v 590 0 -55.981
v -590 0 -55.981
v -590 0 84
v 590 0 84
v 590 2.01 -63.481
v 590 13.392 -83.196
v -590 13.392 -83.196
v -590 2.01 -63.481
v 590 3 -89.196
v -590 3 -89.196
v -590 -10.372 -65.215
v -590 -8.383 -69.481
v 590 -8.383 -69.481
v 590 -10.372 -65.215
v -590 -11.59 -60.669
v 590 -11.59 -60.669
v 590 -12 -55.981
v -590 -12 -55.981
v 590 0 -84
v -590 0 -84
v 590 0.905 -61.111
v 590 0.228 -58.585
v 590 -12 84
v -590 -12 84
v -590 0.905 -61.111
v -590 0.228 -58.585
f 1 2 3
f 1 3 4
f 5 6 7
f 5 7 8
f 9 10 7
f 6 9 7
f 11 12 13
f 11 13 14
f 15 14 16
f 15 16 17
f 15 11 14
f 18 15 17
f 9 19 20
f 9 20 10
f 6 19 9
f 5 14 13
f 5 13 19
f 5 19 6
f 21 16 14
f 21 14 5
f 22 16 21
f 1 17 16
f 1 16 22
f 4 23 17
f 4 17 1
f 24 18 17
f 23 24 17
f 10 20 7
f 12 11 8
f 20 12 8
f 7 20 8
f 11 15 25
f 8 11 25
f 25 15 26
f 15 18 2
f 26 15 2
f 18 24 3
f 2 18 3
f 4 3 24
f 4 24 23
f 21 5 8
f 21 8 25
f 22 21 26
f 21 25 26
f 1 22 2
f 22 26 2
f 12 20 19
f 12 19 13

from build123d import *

# Parameters (mm, degrees)
SKETCH1_W            = 1180
SKETCH1_H            = 168
BASE_FLANGE1_DEPTH   = 12
EDGE_FLANGE1_START   = -590
EDGE_FLANGE1_DEPTH   = 1180
EDGE_FLANGE1_2_DEPTH = 1180


# Read off the part's stored shape, not the designer's step: Edge-Flange1
# Sheet-metal steps are written as plain solids
with BuildPart() as part:
    # Sketch1 → Base-Flange1 (new body)
    with BuildSketch(Plane(origin=(0, 0, 0), x_dir=(1, 0, 0), z_dir=(0, 1, 0))):
        Rectangle(SKETCH1_W, SKETCH1_H)
    extrude(amount=-BASE_FLANGE1_DEPTH)

    # Edge-Flange1 outline → Edge-Flange1 (cut)
    with BuildSketch(Plane.YZ.offset(EDGE_FLANGE1_START)):
        with BuildLine():
            Line((0, -84), (-8.382685902, -69.480762114))
            ThreePointArc((-8.382685902, -69.480762114), (-11.07999731, -62.968876332), (-12, -55.980762114))
            Line((-12, -55.980762114), (-12, -84))
            Line((-12, -84), (0, -84))
        make_face()
    extrude(amount=EDGE_FLANGE1_DEPTH, mode=Mode.SUBTRACT)

    # Edge-Flange1 2 outline → Edge-Flange1 2 (add)
    with BuildSketch(Plane.YZ.offset(EDGE_FLANGE1_START)):
        with BuildLine():
            Line((0, -55.980762114), (0, -84))
            Line((0, -84), (3, -89.196152423))
            Line((3, -89.196152423), (13.392304845, -83.196152423))
            Line((13.392304845, -83.196152423), (2.009618943, -63.480762114))
            ThreePointArc((2.009618943, -63.480762114), (0.511112606, -59.86304779), (0, -55.980762114))
        make_face()
    extrude(amount=EDGE_FLANGE1_2_DEPTH)


solid = part.part
